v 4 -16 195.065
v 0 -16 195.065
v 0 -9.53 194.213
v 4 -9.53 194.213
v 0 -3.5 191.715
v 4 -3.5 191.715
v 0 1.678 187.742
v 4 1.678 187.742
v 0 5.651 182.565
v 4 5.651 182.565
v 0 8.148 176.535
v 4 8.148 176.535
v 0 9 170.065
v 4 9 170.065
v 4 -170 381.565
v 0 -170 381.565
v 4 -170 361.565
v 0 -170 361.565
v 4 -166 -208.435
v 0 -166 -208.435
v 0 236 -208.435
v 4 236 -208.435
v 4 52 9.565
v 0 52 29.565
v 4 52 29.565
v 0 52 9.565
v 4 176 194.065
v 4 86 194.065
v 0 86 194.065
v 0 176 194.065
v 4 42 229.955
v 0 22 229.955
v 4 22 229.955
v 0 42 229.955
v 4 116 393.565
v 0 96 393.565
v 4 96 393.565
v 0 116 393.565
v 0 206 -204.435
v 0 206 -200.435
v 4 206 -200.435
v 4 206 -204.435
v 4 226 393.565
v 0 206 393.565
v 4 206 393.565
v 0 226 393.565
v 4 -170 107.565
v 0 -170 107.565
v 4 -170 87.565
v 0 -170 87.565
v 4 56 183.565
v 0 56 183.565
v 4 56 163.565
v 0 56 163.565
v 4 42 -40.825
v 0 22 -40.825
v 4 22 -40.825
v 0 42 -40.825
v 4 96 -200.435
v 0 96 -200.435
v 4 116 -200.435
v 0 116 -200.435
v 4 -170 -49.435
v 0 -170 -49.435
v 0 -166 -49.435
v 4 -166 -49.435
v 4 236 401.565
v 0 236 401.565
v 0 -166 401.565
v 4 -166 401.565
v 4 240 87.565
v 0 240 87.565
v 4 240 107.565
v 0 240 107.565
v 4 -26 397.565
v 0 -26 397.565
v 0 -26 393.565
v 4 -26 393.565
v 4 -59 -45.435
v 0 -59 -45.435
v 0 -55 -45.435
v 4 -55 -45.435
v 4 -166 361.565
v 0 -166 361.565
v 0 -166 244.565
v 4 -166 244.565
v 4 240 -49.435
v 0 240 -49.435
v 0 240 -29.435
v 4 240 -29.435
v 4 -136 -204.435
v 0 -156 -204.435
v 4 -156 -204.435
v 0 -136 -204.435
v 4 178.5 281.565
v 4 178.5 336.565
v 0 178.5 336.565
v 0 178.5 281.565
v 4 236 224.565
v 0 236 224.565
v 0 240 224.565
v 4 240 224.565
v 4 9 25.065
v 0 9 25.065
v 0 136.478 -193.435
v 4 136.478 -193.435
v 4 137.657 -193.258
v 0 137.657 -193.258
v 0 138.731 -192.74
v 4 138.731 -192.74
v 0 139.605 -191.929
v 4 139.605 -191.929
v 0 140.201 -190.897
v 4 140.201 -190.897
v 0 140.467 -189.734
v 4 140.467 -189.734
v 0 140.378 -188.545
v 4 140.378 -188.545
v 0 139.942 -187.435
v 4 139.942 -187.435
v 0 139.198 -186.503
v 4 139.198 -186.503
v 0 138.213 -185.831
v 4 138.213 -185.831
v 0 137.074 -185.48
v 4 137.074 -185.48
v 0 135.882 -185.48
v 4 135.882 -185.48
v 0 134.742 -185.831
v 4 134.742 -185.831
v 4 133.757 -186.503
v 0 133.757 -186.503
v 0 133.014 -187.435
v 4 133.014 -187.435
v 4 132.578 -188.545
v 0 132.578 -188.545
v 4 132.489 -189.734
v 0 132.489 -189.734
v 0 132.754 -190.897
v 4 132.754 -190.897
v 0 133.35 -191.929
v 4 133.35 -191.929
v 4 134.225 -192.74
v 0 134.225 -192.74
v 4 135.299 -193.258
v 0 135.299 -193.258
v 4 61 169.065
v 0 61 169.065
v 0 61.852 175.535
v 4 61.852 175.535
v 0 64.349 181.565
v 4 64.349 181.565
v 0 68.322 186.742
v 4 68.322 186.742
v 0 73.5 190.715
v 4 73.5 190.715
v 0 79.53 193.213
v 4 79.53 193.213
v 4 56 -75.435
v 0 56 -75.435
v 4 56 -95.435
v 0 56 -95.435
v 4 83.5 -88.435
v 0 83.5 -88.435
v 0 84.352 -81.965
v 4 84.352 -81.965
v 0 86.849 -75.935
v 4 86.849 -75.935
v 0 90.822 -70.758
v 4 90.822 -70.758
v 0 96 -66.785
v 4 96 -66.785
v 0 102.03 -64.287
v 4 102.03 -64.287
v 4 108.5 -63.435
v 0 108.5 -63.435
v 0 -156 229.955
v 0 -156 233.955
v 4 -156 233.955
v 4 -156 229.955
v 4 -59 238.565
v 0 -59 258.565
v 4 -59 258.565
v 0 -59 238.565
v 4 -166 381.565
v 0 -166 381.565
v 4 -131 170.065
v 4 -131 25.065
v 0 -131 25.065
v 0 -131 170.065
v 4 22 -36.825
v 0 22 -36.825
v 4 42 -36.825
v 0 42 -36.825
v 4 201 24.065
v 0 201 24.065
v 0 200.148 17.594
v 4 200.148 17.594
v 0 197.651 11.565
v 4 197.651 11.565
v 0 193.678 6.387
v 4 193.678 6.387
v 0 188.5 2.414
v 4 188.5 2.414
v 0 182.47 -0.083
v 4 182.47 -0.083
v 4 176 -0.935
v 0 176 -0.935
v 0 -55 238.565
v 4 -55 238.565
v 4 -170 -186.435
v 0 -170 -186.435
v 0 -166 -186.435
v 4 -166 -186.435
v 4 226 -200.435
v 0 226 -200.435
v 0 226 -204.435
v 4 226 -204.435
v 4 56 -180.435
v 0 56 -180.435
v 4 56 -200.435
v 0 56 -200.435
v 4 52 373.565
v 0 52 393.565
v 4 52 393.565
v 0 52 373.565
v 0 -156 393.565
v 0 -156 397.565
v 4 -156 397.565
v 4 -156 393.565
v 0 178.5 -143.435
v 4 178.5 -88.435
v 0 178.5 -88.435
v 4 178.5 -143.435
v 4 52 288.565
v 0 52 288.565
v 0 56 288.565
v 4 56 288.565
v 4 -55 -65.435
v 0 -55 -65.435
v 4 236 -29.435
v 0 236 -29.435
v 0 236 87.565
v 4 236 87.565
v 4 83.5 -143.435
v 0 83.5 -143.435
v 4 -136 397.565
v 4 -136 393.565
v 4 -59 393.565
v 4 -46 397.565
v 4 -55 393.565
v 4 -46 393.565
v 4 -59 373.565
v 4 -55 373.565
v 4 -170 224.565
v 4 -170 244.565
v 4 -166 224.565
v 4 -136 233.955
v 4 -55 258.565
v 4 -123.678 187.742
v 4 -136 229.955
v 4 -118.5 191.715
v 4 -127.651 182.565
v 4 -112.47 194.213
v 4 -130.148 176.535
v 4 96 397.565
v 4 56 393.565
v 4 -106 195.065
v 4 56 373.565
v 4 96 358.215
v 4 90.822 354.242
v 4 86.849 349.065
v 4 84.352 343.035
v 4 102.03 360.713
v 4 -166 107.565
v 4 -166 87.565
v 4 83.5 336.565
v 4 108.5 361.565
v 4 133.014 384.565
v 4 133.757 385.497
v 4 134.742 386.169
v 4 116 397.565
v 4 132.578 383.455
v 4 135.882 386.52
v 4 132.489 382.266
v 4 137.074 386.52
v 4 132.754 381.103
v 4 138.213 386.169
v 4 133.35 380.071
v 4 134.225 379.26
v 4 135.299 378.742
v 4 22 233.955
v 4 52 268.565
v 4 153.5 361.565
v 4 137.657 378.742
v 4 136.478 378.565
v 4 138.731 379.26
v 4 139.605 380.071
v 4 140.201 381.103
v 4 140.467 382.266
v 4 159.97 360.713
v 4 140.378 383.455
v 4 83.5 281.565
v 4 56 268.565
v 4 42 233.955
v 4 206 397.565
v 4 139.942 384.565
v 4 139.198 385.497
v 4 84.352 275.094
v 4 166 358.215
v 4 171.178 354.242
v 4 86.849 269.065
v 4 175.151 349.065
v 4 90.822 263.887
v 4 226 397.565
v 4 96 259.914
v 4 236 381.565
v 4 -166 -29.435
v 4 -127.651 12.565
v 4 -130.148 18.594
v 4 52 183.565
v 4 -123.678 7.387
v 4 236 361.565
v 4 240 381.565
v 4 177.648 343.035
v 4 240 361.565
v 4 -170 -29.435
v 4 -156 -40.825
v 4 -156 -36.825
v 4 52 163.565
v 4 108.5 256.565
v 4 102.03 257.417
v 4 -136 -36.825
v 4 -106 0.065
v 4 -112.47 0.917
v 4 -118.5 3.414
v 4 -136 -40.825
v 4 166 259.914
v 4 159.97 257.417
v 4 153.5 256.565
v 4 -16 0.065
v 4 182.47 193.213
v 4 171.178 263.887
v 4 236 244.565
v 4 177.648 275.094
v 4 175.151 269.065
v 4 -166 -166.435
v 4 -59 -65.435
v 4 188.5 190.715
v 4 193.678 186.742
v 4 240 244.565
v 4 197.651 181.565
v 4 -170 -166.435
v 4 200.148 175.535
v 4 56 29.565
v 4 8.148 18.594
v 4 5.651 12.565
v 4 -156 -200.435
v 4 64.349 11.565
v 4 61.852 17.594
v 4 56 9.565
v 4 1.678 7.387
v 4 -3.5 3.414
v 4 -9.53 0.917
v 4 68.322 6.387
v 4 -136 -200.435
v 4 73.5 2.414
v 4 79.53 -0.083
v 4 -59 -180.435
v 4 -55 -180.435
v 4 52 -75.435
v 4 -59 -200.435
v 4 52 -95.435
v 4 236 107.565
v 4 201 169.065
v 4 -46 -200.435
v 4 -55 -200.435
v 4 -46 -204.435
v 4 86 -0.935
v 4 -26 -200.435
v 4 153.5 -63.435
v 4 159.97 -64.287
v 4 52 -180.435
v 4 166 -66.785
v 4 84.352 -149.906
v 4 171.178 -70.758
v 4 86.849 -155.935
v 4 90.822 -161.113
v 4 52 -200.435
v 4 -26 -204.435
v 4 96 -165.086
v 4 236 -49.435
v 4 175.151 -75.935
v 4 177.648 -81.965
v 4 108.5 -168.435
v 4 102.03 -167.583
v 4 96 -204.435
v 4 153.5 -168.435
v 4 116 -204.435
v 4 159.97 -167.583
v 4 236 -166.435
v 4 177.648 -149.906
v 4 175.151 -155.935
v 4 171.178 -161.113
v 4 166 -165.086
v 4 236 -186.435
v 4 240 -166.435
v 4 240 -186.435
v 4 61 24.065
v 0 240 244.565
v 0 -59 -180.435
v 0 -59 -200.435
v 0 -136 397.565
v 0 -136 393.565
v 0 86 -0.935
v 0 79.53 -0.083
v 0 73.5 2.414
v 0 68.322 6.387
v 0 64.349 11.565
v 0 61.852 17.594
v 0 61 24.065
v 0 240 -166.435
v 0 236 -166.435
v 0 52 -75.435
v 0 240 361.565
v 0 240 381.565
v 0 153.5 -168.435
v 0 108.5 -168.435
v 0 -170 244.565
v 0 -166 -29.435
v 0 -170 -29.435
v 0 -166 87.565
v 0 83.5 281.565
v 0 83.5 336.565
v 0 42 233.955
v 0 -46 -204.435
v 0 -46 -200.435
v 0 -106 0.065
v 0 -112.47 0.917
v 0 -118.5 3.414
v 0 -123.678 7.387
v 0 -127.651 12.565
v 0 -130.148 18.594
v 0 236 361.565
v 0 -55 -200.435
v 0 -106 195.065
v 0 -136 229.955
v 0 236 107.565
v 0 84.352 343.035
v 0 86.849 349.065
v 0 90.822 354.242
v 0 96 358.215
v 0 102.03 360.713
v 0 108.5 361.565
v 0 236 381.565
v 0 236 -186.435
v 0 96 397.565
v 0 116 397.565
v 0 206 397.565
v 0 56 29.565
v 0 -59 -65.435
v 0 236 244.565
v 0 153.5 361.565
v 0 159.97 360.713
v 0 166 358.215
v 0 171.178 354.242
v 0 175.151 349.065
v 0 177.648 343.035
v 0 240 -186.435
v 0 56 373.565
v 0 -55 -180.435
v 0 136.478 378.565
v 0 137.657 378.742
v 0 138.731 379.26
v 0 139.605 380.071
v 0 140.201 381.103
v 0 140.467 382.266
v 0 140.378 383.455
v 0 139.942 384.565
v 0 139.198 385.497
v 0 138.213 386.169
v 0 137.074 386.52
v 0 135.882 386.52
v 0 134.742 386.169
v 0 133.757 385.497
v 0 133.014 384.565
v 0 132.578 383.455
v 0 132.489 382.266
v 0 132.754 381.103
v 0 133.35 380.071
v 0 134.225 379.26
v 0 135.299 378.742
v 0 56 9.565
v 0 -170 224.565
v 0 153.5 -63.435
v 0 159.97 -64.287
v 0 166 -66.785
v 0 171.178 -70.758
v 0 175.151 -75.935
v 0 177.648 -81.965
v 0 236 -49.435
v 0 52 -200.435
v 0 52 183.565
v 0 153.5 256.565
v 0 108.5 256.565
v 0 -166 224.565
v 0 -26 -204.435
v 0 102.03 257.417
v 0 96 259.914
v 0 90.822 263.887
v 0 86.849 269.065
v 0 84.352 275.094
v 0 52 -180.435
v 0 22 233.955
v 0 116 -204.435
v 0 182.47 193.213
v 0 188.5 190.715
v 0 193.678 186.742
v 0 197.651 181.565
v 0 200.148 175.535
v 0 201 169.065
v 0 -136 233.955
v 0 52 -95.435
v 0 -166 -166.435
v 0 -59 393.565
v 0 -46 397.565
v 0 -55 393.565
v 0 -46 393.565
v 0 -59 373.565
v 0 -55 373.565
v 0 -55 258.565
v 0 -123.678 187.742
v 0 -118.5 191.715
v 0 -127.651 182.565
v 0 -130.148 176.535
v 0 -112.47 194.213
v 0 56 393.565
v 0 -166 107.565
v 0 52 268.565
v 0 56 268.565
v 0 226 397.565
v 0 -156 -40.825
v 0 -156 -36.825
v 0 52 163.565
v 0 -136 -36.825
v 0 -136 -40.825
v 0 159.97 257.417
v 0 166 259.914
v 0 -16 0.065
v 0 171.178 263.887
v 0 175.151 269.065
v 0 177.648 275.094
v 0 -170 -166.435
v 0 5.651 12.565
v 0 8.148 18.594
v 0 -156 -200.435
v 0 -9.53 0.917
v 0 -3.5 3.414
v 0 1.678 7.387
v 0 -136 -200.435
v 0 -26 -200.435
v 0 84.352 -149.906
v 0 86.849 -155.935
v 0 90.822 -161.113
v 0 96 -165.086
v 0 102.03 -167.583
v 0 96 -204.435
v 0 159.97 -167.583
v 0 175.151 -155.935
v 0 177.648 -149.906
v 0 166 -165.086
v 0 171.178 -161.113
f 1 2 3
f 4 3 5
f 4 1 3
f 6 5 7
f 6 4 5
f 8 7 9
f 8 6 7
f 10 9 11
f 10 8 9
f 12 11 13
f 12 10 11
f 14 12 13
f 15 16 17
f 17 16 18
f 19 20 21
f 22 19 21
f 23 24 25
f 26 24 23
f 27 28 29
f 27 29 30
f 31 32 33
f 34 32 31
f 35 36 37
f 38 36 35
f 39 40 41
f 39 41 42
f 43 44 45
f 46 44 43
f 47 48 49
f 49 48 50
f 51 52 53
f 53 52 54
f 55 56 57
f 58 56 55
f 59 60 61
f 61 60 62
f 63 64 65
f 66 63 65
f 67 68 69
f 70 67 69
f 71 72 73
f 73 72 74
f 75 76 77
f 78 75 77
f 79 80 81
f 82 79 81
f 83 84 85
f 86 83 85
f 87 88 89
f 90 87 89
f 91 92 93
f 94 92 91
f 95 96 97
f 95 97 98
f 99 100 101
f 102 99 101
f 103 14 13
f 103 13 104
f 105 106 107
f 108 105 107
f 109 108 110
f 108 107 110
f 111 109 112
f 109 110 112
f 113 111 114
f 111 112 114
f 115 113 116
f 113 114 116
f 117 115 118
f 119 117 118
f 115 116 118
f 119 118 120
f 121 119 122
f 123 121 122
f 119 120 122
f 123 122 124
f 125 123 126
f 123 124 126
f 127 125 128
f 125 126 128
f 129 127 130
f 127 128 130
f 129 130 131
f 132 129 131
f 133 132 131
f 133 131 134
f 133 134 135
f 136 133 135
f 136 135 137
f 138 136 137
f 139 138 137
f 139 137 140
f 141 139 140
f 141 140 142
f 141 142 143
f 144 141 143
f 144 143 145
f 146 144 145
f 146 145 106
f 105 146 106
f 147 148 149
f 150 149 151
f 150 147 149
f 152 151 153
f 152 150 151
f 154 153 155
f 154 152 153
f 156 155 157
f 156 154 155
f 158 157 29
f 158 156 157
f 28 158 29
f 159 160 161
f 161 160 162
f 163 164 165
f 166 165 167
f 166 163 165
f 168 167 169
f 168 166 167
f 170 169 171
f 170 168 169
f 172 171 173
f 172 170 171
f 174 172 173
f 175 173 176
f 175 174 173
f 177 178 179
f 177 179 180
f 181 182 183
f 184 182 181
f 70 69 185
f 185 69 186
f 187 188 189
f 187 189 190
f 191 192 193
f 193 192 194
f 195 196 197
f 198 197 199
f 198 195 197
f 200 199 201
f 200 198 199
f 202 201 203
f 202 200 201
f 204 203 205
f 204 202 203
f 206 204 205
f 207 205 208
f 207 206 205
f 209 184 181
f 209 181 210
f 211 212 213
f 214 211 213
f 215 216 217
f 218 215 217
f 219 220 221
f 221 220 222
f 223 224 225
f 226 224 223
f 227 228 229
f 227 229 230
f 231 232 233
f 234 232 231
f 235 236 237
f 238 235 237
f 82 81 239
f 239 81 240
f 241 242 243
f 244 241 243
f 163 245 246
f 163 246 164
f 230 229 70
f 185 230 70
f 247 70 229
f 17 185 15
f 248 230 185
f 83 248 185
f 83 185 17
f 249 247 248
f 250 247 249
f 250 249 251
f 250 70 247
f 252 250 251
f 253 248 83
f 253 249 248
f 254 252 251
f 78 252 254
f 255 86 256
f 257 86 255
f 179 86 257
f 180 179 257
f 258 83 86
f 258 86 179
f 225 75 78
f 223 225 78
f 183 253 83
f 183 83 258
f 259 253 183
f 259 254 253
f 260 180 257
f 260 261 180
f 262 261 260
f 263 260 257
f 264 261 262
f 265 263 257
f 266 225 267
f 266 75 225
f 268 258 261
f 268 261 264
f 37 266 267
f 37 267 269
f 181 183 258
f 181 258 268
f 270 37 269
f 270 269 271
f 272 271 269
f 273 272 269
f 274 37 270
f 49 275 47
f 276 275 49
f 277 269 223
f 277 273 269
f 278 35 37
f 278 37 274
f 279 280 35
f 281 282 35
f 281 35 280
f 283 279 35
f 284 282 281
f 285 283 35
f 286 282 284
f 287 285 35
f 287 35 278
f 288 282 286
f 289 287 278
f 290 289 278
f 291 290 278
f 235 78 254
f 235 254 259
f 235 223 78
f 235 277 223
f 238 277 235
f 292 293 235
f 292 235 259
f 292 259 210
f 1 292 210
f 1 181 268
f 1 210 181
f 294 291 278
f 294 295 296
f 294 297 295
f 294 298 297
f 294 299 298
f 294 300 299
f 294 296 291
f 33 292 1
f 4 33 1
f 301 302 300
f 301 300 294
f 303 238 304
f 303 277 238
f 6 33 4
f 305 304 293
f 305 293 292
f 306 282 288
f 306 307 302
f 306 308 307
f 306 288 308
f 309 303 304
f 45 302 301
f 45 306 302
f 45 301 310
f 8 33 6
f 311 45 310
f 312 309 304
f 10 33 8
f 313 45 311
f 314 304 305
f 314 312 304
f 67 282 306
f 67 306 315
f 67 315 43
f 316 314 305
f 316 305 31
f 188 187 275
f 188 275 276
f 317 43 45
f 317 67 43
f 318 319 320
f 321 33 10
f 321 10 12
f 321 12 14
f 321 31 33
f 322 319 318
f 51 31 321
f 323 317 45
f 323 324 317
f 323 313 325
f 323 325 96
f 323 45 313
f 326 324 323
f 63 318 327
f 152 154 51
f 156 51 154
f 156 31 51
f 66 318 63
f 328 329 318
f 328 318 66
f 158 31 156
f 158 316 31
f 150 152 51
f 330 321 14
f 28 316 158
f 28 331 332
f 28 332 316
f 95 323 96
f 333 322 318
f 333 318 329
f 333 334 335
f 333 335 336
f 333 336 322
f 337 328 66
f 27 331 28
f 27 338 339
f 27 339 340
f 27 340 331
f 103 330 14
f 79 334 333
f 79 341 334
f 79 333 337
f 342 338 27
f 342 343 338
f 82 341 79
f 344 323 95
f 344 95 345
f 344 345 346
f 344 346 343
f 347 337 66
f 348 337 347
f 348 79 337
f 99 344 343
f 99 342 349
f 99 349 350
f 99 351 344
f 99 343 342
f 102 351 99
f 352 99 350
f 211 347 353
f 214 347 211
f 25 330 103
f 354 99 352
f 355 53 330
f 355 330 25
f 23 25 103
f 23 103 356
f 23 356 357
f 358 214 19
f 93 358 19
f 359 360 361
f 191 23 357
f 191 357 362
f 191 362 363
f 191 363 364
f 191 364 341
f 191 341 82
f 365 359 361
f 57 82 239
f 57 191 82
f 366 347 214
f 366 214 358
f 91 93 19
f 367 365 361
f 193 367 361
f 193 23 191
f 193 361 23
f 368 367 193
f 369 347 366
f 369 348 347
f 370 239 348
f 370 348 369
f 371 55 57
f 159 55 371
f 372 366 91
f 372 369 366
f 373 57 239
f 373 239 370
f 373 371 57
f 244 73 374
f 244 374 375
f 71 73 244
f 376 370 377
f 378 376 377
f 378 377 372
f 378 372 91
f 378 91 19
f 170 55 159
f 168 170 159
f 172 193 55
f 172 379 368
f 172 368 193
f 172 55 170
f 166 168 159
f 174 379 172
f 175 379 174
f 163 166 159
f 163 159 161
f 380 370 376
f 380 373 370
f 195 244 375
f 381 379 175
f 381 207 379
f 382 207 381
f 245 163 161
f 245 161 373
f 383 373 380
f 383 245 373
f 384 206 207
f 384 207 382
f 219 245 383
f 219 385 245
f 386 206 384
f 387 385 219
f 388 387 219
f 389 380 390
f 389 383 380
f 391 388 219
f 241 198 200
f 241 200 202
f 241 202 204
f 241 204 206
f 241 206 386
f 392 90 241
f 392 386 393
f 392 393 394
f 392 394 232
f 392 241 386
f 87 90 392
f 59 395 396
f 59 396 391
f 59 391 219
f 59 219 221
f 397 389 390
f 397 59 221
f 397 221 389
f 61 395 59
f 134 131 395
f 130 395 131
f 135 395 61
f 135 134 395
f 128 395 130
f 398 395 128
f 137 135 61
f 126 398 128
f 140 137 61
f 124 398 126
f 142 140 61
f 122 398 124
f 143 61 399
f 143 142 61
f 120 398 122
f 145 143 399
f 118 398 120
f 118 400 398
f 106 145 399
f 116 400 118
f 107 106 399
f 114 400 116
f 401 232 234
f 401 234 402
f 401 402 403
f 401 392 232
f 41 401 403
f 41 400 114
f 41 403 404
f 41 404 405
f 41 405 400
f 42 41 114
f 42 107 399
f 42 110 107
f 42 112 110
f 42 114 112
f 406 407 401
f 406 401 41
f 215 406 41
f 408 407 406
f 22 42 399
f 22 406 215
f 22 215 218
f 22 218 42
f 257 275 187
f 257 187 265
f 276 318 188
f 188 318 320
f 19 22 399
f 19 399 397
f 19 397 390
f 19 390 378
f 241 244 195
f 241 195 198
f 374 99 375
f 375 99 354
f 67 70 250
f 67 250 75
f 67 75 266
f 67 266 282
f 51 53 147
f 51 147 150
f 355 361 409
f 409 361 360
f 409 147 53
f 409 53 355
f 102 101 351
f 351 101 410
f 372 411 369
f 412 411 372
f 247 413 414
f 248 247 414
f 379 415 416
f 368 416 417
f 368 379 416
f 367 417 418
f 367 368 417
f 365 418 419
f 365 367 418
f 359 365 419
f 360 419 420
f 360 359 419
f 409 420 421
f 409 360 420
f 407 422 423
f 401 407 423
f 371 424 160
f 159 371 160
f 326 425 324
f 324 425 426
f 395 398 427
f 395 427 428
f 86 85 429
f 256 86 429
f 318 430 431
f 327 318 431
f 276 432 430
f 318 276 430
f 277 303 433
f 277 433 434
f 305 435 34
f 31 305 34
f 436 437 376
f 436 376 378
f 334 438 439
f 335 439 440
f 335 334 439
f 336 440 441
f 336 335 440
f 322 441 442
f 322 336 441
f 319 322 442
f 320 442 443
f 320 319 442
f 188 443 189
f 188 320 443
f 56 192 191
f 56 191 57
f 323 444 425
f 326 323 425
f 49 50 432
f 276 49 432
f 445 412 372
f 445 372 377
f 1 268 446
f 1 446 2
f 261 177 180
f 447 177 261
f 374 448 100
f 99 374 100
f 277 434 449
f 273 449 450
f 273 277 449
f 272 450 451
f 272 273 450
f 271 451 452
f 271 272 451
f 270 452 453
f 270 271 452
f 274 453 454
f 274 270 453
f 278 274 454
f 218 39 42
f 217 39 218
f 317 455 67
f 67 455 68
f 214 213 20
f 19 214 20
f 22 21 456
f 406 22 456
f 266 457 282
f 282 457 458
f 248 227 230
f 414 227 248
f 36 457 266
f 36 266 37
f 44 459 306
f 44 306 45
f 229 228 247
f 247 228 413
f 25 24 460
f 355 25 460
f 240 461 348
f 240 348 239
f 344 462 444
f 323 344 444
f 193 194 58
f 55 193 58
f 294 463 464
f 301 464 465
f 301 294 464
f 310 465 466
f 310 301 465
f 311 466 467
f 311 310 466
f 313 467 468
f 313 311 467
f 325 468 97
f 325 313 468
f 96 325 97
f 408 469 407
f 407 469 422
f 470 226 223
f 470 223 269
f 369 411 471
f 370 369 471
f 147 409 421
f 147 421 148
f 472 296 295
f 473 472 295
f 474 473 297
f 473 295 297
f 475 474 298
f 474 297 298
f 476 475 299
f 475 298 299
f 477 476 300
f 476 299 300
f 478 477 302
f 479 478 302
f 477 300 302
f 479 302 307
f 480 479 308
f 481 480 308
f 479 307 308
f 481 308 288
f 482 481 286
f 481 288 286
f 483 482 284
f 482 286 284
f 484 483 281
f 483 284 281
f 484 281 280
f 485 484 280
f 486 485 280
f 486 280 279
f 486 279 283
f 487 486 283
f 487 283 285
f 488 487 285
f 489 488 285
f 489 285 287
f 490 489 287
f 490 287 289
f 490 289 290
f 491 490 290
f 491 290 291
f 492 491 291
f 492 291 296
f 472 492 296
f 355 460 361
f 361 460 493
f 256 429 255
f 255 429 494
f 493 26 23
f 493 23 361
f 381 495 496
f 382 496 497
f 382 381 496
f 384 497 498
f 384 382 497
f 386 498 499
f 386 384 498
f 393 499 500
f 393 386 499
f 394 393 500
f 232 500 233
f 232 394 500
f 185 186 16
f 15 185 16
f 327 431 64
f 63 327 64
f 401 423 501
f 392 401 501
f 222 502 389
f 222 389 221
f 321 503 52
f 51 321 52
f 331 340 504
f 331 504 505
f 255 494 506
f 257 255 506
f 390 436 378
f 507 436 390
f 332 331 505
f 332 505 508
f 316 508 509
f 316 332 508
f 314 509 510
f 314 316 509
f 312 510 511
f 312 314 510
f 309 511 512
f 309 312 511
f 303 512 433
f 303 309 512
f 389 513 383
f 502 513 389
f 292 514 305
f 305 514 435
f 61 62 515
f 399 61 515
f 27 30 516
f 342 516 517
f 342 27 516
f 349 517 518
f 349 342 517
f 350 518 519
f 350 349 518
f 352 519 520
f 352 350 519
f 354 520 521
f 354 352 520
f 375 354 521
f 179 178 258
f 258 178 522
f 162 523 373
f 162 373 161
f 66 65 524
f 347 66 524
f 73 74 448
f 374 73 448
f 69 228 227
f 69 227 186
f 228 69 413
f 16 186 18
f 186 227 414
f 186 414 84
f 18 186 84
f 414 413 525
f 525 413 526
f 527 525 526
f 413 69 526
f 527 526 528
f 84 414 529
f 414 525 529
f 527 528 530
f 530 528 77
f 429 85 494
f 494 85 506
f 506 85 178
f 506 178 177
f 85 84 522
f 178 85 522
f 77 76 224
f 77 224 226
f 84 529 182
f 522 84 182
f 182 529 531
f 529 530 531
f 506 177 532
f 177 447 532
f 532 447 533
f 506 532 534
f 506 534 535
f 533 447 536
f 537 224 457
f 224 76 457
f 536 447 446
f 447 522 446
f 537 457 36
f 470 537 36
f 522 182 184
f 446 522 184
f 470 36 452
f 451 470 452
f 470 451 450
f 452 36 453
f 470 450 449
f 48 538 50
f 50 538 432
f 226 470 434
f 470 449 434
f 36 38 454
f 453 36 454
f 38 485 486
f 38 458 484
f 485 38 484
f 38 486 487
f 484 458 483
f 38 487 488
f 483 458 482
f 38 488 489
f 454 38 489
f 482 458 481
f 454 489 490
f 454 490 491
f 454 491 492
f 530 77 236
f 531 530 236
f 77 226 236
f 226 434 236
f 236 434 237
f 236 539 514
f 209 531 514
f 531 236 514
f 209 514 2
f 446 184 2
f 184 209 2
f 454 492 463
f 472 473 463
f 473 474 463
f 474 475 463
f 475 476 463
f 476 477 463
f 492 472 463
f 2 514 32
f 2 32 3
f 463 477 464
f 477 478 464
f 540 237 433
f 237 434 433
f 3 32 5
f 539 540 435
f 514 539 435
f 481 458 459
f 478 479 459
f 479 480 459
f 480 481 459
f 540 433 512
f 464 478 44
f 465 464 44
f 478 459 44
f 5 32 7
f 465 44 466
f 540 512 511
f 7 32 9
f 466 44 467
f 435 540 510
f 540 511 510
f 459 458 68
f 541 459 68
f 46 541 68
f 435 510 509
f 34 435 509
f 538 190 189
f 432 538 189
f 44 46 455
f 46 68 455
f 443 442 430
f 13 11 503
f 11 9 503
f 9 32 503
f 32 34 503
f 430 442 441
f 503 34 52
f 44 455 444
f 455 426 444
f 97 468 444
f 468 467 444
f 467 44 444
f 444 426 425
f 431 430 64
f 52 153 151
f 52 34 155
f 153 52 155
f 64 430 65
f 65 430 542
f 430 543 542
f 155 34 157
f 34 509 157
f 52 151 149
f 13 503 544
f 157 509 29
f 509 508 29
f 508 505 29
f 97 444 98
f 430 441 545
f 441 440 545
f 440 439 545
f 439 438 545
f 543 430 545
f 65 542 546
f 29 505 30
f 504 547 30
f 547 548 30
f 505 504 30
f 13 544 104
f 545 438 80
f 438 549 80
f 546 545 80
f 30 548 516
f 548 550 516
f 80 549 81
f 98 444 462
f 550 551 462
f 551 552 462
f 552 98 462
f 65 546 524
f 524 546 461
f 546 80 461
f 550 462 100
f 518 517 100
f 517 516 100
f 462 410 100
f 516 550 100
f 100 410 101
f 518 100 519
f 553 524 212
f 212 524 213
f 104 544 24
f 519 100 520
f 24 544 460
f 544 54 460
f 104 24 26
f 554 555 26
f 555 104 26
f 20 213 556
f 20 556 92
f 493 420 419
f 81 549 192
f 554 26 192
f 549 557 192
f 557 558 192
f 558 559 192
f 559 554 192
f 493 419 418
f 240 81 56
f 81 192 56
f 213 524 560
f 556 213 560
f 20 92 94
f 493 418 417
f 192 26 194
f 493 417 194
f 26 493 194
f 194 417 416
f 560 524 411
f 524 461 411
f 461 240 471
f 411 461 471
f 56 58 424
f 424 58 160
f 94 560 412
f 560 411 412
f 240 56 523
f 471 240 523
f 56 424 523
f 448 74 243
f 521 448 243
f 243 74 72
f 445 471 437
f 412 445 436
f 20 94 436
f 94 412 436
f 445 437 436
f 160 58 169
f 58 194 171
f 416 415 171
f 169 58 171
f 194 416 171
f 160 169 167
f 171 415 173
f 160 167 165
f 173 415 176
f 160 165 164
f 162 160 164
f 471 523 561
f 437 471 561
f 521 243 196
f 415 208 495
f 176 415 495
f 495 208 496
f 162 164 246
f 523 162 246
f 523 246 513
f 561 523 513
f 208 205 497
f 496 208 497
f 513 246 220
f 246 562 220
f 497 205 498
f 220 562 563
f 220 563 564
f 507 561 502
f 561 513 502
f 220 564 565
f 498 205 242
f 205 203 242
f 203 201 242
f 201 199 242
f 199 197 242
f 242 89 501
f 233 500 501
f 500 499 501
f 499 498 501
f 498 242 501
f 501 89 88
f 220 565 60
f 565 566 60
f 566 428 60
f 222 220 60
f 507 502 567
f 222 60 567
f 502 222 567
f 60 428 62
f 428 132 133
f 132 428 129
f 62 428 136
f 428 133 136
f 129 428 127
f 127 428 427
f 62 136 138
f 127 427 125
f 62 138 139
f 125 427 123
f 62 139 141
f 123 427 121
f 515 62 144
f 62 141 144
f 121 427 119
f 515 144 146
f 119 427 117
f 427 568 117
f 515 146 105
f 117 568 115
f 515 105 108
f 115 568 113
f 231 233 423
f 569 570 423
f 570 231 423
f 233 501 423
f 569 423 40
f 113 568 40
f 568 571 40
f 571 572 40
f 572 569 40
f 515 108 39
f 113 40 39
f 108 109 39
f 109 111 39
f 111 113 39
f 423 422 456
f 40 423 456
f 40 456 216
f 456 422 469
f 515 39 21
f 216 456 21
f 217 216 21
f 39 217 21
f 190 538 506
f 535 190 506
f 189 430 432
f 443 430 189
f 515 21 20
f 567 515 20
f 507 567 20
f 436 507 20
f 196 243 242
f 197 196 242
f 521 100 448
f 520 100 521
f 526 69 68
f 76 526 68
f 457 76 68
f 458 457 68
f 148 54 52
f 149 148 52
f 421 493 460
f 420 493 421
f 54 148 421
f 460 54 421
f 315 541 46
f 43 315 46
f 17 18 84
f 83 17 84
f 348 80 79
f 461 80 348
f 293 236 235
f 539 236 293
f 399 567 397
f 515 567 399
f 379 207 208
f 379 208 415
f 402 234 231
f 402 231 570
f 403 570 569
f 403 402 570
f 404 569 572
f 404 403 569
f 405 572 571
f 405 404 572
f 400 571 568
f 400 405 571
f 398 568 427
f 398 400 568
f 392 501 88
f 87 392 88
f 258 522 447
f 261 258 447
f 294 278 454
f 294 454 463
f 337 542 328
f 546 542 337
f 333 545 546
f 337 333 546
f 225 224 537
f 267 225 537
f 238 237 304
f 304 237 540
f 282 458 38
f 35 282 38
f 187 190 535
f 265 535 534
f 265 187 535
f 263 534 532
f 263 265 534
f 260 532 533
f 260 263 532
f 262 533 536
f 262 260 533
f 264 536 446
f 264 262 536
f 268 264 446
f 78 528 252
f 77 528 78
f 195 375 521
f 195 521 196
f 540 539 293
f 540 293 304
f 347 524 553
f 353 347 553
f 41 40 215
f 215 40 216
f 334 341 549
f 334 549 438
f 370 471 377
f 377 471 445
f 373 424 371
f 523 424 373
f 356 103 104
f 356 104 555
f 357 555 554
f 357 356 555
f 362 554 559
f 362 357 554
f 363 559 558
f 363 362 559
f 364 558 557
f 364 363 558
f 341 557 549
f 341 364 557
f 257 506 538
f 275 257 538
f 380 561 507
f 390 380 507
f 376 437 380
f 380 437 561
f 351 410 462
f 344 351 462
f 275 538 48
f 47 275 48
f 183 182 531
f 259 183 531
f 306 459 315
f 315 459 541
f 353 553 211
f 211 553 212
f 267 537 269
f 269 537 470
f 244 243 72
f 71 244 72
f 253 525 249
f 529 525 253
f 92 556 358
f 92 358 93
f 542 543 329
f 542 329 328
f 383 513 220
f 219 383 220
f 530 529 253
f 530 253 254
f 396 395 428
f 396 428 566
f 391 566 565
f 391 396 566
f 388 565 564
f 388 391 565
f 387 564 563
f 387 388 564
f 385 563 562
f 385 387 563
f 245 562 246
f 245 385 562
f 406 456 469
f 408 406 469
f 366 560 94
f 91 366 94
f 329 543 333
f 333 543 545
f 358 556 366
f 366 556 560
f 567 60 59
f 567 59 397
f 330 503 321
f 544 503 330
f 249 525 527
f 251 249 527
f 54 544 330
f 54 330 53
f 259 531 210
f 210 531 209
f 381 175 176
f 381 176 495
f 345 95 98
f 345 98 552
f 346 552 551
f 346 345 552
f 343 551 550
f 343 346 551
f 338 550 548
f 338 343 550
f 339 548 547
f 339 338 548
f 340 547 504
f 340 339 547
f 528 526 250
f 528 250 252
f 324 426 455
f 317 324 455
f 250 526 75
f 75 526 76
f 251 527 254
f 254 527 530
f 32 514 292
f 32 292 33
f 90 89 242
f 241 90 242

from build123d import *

# Parameters (mm, degrees)
SKETCH1_W           = 20
SKETCH1_H           = 4
SKETCH1_W_2         = 4
SKETCH1_H_2         = 20
BOSS_EXTRUDE1_DEPTH = 4
CUT_EXTRUDE1_DEPTH  = 10
SKETCH3_R           = 4
CUT_EXTRUDE2_DEPTH  = 10


with BuildPart() as part:
    # Sketch1 → Boss-Extrude1 (new body)
    with BuildSketch(Plane(origin=(0, 0, 0), x_dir=(0, 0, -1), z_dir=(1, 0, 0))):
        Polygon((-401.564712347, -166), (-381.564712347, -166), (-381.564712347, -170), (-361.564712347, -170), (-361.564712347, -166), (-244.564712347, -166), (-244.564712347, -170), (-224.564712347, -170), (-224.564712347, -166), (-107.564712347, -166), (-107.564712347, -170), (-87.564712347, -170), (-87.564712347, -166), (29.435287653, -166), (29.435287653, -170), (49.435287653, -170), (49.435287653, -166), (166.435287653, -166), (166.435287653, -170), (186.435287653, -170), (186.435287653, -166), (208.435287653, -166), (208.435287653, 236), (186.435287653, 236), (186.435287653, 240), (166.435287653, 240), (166.435287653, 236), (49.435287653, 236), (49.435287653, 240), (29.435287653, 240), (29.435287653, 236), (-87.564712347, 236), (-87.564712347, 240), (-107.564712347, 240), (-107.564712347, 236), (-224.564712347, 236), (-224.564712347, 240), (-244.564712347, 240), (-244.564712347, 236), (-361.564712347, 236), (-361.564712347, 240), (-381.564712347, 240), (-381.564712347, 236), (-401.564712347, 236), align=None)
        with Locations((190.435287653, -57)):
            Rectangle(SKETCH1_W, SKETCH1_H, mode=Mode.SUBTRACT)
        with Locations((38.825287653, 32)):
            Rectangle(SKETCH1_W_2, SKETCH1_H_2, mode=Mode.SUBTRACT)
        with Locations((38.825287653, -146)):
            Rectangle(SKETCH1_W_2, SKETCH1_H_2, mode=Mode.SUBTRACT)
        with Locations((-395.564712347, 216)):
            Rectangle(SKETCH1_W_2, SKETCH1_H_2, mode=Mode.SUBTRACT)
        with Locations((-395.564712347, 106)):
            Rectangle(SKETCH1_W_2, SKETCH1_H_2, mode=Mode.SUBTRACT)
        with Locations((-395.564712347, -36)):
            Rectangle(SKETCH1_W_2, SKETCH1_H_2, mode=Mode.SUBTRACT)
        with Locations((-395.564712347, -146)):
            Rectangle(SKETCH1_W_2, SKETCH1_H_2, mode=Mode.SUBTRACT)
        with Locations((202.435287653, 216)):
            Rectangle(SKETCH1_W_2, SKETCH1_H_2, mode=Mode.SUBTRACT)
        with Locations((202.435287653, 106)):
            Rectangle(SKETCH1_W_2, SKETCH1_H_2, mode=Mode.SUBTRACT)
        with Locations((202.435287653, -36)):
            Rectangle(SKETCH1_W_2, SKETCH1_H_2, mode=Mode.SUBTRACT)
        with Locations((202.435287653, -146)):
            Rectangle(SKETCH1_W_2, SKETCH1_H_2, mode=Mode.SUBTRACT)
        with Locations((190.435287653, 54)):
            Rectangle(SKETCH1_W, SKETCH1_H, mode=Mode.SUBTRACT)
        with Locations((-231.954712347, -146)):
            Rectangle(SKETCH1_W_2, SKETCH1_H_2, mode=Mode.SUBTRACT)
        with Locations((-231.954712347, 32)):
            Rectangle(SKETCH1_W_2, SKETCH1_H_2, mode=Mode.SUBTRACT)
        with Locations((-383.564712347, 54)):
            Rectangle(SKETCH1_W, SKETCH1_H, mode=Mode.SUBTRACT)
        with Locations((-278.564712347, 54)):
            Rectangle(SKETCH1_W, SKETCH1_H, mode=Mode.SUBTRACT)
        with Locations((-173.564712347, 54)):
            Rectangle(SKETCH1_W, SKETCH1_H, mode=Mode.SUBTRACT)
        with Locations((85.435287653, 54)):
            Rectangle(SKETCH1_W, SKETCH1_H, mode=Mode.SUBTRACT)
        with Locations((-19.564712347, 54)):
            Rectangle(SKETCH1_W, SKETCH1_H, mode=Mode.SUBTRACT)
        with Locations((-248.564712347, -57)):
            Rectangle(SKETCH1_W, SKETCH1_H, mode=Mode.SUBTRACT)
        with Locations((-383.564712347, -57)):
            Rectangle(SKETCH1_W, SKETCH1_H, mode=Mode.SUBTRACT)
        with Locations((55.435287653, -57)):
            Rectangle(SKETCH1_W, SKETCH1_H, mode=Mode.SUBTRACT)
    extrude(amount=BOSS_EXTRUDE1_DEPTH)

    # Sketch2 → Cut-Extrude1 (cut)
    with BuildSketch(Plane(origin=(4, 0, 0), x_dir=(0, 0, -1), z_dir=(1, 0, 0))):
        with BuildLine():
            Line((-170.064712347, 9), (-25.064712347, 9))
            ThreePointArc((-25.064712347, 9), (-7.387042818, 1.67766953), (-0.064712347, -16))
            Line((-0.064712347, -16), (-0.064712347, -106))
            ThreePointArc((-0.064712347, -106), (-7.387042818, -123.67766953), (-25.064712347, -131))
            Line((-25.064712347, -131), (-170.064712347, -131))
            ThreePointArc((-170.064712347, -131), (-187.742381877, -123.67766953), (-195.064712347, -106))
            Line((-195.064712347, -106), (-195.064712347, -16))
            ThreePointArc((-195.064712347, -16), (-187.742381877, 1.67766953), (-170.064712347, 9))
        make_face()
        with BuildLine():
            Line((-169.064712347, 201), (-24.064712347, 201))
            ThreePointArc((-24.064712347, 201), (-6.387042818, 193.67766953), (0.935287653, 176))
            Line((0.935287653, 176), (0.935287653, 86))
            ThreePointArc((0.935287653, 86), (-6.387042818, 68.32233047), (-24.064712347, 61))
            Line((-24.064712347, 61), (-169.064712347, 61))
            ThreePointArc((-169.064712347, 61), (-186.742381877, 68.32233047), (-194.064712347, 86))
            Line((-194.064712347, 86), (-194.064712347, 176))
            ThreePointArc((-194.064712347, 176), (-186.742381877, 193.67766953), (-169.064712347, 201))
        make_face()
        with BuildLine():
            Line((-336.564712347, 178.5), (-281.564712347, 178.5))
            ThreePointArc((-281.564712347, 178.5), (-263.887042818, 171.17766953), (-256.564712347, 153.5))
            Line((-256.564712347, 153.5), (-256.564712347, 108.5))
            ThreePointArc((-256.564712347, 108.5), (-263.887042818, 90.82233047), (-281.564712347, 83.5))
            Line((-281.564712347, 83.5), (-336.564712347, 83.5))
            ThreePointArc((-336.564712347, 83.5), (-354.242381877, 90.82233047), (-361.564712347, 108.5))
            Line((-361.564712347, 108.5), (-361.564712347, 153.5))
            ThreePointArc((-361.564712347, 153.5), (-354.242381877, 171.17766953), (-336.564712347, 178.5))
        make_face()
        with BuildLine():
            Line((88.435287653, 178.5), (143.435287653, 178.5))
            ThreePointArc((143.435287653, 178.5), (161.112957182, 171.17766953), (168.435287653, 153.5))
            Line((168.435287653, 153.5), (168.435287653, 108.5))
            ThreePointArc((168.435287653, 108.5), (161.112957182, 90.82233047), (143.435287653, 83.5))
            Line((143.435287653, 83.5), (88.435287653, 83.5))
            ThreePointArc((88.435287653, 83.5), (70.757618123, 90.82233047), (63.435287653, 108.5))
            Line((63.435287653, 108.5), (63.435287653, 153.5))
            ThreePointArc((63.435287653, 153.5), (70.757618123, 171.17766953), (88.435287653, 178.5))
        make_face()
    extrude(amount=-CUT_EXTRUDE1_DEPTH, mode=Mode.SUBTRACT)

    # Sketch3 → Cut-Extrude2 (cut)
    with BuildSketch(Plane(origin=(4, 0, 0), x_dir=(0, 0, -1), z_dir=(1, 0, 0))):
        with Locations((-382.564712347, 136.477800328)):
            Circle(SKETCH3_R)
        with Locations((189.435287653, 136.477800328)):
            Circle(SKETCH3_R)
    extrude(amount=-CUT_EXTRUDE2_DEPTH, mode=Mode.SUBTRACT)


solid = part.part
